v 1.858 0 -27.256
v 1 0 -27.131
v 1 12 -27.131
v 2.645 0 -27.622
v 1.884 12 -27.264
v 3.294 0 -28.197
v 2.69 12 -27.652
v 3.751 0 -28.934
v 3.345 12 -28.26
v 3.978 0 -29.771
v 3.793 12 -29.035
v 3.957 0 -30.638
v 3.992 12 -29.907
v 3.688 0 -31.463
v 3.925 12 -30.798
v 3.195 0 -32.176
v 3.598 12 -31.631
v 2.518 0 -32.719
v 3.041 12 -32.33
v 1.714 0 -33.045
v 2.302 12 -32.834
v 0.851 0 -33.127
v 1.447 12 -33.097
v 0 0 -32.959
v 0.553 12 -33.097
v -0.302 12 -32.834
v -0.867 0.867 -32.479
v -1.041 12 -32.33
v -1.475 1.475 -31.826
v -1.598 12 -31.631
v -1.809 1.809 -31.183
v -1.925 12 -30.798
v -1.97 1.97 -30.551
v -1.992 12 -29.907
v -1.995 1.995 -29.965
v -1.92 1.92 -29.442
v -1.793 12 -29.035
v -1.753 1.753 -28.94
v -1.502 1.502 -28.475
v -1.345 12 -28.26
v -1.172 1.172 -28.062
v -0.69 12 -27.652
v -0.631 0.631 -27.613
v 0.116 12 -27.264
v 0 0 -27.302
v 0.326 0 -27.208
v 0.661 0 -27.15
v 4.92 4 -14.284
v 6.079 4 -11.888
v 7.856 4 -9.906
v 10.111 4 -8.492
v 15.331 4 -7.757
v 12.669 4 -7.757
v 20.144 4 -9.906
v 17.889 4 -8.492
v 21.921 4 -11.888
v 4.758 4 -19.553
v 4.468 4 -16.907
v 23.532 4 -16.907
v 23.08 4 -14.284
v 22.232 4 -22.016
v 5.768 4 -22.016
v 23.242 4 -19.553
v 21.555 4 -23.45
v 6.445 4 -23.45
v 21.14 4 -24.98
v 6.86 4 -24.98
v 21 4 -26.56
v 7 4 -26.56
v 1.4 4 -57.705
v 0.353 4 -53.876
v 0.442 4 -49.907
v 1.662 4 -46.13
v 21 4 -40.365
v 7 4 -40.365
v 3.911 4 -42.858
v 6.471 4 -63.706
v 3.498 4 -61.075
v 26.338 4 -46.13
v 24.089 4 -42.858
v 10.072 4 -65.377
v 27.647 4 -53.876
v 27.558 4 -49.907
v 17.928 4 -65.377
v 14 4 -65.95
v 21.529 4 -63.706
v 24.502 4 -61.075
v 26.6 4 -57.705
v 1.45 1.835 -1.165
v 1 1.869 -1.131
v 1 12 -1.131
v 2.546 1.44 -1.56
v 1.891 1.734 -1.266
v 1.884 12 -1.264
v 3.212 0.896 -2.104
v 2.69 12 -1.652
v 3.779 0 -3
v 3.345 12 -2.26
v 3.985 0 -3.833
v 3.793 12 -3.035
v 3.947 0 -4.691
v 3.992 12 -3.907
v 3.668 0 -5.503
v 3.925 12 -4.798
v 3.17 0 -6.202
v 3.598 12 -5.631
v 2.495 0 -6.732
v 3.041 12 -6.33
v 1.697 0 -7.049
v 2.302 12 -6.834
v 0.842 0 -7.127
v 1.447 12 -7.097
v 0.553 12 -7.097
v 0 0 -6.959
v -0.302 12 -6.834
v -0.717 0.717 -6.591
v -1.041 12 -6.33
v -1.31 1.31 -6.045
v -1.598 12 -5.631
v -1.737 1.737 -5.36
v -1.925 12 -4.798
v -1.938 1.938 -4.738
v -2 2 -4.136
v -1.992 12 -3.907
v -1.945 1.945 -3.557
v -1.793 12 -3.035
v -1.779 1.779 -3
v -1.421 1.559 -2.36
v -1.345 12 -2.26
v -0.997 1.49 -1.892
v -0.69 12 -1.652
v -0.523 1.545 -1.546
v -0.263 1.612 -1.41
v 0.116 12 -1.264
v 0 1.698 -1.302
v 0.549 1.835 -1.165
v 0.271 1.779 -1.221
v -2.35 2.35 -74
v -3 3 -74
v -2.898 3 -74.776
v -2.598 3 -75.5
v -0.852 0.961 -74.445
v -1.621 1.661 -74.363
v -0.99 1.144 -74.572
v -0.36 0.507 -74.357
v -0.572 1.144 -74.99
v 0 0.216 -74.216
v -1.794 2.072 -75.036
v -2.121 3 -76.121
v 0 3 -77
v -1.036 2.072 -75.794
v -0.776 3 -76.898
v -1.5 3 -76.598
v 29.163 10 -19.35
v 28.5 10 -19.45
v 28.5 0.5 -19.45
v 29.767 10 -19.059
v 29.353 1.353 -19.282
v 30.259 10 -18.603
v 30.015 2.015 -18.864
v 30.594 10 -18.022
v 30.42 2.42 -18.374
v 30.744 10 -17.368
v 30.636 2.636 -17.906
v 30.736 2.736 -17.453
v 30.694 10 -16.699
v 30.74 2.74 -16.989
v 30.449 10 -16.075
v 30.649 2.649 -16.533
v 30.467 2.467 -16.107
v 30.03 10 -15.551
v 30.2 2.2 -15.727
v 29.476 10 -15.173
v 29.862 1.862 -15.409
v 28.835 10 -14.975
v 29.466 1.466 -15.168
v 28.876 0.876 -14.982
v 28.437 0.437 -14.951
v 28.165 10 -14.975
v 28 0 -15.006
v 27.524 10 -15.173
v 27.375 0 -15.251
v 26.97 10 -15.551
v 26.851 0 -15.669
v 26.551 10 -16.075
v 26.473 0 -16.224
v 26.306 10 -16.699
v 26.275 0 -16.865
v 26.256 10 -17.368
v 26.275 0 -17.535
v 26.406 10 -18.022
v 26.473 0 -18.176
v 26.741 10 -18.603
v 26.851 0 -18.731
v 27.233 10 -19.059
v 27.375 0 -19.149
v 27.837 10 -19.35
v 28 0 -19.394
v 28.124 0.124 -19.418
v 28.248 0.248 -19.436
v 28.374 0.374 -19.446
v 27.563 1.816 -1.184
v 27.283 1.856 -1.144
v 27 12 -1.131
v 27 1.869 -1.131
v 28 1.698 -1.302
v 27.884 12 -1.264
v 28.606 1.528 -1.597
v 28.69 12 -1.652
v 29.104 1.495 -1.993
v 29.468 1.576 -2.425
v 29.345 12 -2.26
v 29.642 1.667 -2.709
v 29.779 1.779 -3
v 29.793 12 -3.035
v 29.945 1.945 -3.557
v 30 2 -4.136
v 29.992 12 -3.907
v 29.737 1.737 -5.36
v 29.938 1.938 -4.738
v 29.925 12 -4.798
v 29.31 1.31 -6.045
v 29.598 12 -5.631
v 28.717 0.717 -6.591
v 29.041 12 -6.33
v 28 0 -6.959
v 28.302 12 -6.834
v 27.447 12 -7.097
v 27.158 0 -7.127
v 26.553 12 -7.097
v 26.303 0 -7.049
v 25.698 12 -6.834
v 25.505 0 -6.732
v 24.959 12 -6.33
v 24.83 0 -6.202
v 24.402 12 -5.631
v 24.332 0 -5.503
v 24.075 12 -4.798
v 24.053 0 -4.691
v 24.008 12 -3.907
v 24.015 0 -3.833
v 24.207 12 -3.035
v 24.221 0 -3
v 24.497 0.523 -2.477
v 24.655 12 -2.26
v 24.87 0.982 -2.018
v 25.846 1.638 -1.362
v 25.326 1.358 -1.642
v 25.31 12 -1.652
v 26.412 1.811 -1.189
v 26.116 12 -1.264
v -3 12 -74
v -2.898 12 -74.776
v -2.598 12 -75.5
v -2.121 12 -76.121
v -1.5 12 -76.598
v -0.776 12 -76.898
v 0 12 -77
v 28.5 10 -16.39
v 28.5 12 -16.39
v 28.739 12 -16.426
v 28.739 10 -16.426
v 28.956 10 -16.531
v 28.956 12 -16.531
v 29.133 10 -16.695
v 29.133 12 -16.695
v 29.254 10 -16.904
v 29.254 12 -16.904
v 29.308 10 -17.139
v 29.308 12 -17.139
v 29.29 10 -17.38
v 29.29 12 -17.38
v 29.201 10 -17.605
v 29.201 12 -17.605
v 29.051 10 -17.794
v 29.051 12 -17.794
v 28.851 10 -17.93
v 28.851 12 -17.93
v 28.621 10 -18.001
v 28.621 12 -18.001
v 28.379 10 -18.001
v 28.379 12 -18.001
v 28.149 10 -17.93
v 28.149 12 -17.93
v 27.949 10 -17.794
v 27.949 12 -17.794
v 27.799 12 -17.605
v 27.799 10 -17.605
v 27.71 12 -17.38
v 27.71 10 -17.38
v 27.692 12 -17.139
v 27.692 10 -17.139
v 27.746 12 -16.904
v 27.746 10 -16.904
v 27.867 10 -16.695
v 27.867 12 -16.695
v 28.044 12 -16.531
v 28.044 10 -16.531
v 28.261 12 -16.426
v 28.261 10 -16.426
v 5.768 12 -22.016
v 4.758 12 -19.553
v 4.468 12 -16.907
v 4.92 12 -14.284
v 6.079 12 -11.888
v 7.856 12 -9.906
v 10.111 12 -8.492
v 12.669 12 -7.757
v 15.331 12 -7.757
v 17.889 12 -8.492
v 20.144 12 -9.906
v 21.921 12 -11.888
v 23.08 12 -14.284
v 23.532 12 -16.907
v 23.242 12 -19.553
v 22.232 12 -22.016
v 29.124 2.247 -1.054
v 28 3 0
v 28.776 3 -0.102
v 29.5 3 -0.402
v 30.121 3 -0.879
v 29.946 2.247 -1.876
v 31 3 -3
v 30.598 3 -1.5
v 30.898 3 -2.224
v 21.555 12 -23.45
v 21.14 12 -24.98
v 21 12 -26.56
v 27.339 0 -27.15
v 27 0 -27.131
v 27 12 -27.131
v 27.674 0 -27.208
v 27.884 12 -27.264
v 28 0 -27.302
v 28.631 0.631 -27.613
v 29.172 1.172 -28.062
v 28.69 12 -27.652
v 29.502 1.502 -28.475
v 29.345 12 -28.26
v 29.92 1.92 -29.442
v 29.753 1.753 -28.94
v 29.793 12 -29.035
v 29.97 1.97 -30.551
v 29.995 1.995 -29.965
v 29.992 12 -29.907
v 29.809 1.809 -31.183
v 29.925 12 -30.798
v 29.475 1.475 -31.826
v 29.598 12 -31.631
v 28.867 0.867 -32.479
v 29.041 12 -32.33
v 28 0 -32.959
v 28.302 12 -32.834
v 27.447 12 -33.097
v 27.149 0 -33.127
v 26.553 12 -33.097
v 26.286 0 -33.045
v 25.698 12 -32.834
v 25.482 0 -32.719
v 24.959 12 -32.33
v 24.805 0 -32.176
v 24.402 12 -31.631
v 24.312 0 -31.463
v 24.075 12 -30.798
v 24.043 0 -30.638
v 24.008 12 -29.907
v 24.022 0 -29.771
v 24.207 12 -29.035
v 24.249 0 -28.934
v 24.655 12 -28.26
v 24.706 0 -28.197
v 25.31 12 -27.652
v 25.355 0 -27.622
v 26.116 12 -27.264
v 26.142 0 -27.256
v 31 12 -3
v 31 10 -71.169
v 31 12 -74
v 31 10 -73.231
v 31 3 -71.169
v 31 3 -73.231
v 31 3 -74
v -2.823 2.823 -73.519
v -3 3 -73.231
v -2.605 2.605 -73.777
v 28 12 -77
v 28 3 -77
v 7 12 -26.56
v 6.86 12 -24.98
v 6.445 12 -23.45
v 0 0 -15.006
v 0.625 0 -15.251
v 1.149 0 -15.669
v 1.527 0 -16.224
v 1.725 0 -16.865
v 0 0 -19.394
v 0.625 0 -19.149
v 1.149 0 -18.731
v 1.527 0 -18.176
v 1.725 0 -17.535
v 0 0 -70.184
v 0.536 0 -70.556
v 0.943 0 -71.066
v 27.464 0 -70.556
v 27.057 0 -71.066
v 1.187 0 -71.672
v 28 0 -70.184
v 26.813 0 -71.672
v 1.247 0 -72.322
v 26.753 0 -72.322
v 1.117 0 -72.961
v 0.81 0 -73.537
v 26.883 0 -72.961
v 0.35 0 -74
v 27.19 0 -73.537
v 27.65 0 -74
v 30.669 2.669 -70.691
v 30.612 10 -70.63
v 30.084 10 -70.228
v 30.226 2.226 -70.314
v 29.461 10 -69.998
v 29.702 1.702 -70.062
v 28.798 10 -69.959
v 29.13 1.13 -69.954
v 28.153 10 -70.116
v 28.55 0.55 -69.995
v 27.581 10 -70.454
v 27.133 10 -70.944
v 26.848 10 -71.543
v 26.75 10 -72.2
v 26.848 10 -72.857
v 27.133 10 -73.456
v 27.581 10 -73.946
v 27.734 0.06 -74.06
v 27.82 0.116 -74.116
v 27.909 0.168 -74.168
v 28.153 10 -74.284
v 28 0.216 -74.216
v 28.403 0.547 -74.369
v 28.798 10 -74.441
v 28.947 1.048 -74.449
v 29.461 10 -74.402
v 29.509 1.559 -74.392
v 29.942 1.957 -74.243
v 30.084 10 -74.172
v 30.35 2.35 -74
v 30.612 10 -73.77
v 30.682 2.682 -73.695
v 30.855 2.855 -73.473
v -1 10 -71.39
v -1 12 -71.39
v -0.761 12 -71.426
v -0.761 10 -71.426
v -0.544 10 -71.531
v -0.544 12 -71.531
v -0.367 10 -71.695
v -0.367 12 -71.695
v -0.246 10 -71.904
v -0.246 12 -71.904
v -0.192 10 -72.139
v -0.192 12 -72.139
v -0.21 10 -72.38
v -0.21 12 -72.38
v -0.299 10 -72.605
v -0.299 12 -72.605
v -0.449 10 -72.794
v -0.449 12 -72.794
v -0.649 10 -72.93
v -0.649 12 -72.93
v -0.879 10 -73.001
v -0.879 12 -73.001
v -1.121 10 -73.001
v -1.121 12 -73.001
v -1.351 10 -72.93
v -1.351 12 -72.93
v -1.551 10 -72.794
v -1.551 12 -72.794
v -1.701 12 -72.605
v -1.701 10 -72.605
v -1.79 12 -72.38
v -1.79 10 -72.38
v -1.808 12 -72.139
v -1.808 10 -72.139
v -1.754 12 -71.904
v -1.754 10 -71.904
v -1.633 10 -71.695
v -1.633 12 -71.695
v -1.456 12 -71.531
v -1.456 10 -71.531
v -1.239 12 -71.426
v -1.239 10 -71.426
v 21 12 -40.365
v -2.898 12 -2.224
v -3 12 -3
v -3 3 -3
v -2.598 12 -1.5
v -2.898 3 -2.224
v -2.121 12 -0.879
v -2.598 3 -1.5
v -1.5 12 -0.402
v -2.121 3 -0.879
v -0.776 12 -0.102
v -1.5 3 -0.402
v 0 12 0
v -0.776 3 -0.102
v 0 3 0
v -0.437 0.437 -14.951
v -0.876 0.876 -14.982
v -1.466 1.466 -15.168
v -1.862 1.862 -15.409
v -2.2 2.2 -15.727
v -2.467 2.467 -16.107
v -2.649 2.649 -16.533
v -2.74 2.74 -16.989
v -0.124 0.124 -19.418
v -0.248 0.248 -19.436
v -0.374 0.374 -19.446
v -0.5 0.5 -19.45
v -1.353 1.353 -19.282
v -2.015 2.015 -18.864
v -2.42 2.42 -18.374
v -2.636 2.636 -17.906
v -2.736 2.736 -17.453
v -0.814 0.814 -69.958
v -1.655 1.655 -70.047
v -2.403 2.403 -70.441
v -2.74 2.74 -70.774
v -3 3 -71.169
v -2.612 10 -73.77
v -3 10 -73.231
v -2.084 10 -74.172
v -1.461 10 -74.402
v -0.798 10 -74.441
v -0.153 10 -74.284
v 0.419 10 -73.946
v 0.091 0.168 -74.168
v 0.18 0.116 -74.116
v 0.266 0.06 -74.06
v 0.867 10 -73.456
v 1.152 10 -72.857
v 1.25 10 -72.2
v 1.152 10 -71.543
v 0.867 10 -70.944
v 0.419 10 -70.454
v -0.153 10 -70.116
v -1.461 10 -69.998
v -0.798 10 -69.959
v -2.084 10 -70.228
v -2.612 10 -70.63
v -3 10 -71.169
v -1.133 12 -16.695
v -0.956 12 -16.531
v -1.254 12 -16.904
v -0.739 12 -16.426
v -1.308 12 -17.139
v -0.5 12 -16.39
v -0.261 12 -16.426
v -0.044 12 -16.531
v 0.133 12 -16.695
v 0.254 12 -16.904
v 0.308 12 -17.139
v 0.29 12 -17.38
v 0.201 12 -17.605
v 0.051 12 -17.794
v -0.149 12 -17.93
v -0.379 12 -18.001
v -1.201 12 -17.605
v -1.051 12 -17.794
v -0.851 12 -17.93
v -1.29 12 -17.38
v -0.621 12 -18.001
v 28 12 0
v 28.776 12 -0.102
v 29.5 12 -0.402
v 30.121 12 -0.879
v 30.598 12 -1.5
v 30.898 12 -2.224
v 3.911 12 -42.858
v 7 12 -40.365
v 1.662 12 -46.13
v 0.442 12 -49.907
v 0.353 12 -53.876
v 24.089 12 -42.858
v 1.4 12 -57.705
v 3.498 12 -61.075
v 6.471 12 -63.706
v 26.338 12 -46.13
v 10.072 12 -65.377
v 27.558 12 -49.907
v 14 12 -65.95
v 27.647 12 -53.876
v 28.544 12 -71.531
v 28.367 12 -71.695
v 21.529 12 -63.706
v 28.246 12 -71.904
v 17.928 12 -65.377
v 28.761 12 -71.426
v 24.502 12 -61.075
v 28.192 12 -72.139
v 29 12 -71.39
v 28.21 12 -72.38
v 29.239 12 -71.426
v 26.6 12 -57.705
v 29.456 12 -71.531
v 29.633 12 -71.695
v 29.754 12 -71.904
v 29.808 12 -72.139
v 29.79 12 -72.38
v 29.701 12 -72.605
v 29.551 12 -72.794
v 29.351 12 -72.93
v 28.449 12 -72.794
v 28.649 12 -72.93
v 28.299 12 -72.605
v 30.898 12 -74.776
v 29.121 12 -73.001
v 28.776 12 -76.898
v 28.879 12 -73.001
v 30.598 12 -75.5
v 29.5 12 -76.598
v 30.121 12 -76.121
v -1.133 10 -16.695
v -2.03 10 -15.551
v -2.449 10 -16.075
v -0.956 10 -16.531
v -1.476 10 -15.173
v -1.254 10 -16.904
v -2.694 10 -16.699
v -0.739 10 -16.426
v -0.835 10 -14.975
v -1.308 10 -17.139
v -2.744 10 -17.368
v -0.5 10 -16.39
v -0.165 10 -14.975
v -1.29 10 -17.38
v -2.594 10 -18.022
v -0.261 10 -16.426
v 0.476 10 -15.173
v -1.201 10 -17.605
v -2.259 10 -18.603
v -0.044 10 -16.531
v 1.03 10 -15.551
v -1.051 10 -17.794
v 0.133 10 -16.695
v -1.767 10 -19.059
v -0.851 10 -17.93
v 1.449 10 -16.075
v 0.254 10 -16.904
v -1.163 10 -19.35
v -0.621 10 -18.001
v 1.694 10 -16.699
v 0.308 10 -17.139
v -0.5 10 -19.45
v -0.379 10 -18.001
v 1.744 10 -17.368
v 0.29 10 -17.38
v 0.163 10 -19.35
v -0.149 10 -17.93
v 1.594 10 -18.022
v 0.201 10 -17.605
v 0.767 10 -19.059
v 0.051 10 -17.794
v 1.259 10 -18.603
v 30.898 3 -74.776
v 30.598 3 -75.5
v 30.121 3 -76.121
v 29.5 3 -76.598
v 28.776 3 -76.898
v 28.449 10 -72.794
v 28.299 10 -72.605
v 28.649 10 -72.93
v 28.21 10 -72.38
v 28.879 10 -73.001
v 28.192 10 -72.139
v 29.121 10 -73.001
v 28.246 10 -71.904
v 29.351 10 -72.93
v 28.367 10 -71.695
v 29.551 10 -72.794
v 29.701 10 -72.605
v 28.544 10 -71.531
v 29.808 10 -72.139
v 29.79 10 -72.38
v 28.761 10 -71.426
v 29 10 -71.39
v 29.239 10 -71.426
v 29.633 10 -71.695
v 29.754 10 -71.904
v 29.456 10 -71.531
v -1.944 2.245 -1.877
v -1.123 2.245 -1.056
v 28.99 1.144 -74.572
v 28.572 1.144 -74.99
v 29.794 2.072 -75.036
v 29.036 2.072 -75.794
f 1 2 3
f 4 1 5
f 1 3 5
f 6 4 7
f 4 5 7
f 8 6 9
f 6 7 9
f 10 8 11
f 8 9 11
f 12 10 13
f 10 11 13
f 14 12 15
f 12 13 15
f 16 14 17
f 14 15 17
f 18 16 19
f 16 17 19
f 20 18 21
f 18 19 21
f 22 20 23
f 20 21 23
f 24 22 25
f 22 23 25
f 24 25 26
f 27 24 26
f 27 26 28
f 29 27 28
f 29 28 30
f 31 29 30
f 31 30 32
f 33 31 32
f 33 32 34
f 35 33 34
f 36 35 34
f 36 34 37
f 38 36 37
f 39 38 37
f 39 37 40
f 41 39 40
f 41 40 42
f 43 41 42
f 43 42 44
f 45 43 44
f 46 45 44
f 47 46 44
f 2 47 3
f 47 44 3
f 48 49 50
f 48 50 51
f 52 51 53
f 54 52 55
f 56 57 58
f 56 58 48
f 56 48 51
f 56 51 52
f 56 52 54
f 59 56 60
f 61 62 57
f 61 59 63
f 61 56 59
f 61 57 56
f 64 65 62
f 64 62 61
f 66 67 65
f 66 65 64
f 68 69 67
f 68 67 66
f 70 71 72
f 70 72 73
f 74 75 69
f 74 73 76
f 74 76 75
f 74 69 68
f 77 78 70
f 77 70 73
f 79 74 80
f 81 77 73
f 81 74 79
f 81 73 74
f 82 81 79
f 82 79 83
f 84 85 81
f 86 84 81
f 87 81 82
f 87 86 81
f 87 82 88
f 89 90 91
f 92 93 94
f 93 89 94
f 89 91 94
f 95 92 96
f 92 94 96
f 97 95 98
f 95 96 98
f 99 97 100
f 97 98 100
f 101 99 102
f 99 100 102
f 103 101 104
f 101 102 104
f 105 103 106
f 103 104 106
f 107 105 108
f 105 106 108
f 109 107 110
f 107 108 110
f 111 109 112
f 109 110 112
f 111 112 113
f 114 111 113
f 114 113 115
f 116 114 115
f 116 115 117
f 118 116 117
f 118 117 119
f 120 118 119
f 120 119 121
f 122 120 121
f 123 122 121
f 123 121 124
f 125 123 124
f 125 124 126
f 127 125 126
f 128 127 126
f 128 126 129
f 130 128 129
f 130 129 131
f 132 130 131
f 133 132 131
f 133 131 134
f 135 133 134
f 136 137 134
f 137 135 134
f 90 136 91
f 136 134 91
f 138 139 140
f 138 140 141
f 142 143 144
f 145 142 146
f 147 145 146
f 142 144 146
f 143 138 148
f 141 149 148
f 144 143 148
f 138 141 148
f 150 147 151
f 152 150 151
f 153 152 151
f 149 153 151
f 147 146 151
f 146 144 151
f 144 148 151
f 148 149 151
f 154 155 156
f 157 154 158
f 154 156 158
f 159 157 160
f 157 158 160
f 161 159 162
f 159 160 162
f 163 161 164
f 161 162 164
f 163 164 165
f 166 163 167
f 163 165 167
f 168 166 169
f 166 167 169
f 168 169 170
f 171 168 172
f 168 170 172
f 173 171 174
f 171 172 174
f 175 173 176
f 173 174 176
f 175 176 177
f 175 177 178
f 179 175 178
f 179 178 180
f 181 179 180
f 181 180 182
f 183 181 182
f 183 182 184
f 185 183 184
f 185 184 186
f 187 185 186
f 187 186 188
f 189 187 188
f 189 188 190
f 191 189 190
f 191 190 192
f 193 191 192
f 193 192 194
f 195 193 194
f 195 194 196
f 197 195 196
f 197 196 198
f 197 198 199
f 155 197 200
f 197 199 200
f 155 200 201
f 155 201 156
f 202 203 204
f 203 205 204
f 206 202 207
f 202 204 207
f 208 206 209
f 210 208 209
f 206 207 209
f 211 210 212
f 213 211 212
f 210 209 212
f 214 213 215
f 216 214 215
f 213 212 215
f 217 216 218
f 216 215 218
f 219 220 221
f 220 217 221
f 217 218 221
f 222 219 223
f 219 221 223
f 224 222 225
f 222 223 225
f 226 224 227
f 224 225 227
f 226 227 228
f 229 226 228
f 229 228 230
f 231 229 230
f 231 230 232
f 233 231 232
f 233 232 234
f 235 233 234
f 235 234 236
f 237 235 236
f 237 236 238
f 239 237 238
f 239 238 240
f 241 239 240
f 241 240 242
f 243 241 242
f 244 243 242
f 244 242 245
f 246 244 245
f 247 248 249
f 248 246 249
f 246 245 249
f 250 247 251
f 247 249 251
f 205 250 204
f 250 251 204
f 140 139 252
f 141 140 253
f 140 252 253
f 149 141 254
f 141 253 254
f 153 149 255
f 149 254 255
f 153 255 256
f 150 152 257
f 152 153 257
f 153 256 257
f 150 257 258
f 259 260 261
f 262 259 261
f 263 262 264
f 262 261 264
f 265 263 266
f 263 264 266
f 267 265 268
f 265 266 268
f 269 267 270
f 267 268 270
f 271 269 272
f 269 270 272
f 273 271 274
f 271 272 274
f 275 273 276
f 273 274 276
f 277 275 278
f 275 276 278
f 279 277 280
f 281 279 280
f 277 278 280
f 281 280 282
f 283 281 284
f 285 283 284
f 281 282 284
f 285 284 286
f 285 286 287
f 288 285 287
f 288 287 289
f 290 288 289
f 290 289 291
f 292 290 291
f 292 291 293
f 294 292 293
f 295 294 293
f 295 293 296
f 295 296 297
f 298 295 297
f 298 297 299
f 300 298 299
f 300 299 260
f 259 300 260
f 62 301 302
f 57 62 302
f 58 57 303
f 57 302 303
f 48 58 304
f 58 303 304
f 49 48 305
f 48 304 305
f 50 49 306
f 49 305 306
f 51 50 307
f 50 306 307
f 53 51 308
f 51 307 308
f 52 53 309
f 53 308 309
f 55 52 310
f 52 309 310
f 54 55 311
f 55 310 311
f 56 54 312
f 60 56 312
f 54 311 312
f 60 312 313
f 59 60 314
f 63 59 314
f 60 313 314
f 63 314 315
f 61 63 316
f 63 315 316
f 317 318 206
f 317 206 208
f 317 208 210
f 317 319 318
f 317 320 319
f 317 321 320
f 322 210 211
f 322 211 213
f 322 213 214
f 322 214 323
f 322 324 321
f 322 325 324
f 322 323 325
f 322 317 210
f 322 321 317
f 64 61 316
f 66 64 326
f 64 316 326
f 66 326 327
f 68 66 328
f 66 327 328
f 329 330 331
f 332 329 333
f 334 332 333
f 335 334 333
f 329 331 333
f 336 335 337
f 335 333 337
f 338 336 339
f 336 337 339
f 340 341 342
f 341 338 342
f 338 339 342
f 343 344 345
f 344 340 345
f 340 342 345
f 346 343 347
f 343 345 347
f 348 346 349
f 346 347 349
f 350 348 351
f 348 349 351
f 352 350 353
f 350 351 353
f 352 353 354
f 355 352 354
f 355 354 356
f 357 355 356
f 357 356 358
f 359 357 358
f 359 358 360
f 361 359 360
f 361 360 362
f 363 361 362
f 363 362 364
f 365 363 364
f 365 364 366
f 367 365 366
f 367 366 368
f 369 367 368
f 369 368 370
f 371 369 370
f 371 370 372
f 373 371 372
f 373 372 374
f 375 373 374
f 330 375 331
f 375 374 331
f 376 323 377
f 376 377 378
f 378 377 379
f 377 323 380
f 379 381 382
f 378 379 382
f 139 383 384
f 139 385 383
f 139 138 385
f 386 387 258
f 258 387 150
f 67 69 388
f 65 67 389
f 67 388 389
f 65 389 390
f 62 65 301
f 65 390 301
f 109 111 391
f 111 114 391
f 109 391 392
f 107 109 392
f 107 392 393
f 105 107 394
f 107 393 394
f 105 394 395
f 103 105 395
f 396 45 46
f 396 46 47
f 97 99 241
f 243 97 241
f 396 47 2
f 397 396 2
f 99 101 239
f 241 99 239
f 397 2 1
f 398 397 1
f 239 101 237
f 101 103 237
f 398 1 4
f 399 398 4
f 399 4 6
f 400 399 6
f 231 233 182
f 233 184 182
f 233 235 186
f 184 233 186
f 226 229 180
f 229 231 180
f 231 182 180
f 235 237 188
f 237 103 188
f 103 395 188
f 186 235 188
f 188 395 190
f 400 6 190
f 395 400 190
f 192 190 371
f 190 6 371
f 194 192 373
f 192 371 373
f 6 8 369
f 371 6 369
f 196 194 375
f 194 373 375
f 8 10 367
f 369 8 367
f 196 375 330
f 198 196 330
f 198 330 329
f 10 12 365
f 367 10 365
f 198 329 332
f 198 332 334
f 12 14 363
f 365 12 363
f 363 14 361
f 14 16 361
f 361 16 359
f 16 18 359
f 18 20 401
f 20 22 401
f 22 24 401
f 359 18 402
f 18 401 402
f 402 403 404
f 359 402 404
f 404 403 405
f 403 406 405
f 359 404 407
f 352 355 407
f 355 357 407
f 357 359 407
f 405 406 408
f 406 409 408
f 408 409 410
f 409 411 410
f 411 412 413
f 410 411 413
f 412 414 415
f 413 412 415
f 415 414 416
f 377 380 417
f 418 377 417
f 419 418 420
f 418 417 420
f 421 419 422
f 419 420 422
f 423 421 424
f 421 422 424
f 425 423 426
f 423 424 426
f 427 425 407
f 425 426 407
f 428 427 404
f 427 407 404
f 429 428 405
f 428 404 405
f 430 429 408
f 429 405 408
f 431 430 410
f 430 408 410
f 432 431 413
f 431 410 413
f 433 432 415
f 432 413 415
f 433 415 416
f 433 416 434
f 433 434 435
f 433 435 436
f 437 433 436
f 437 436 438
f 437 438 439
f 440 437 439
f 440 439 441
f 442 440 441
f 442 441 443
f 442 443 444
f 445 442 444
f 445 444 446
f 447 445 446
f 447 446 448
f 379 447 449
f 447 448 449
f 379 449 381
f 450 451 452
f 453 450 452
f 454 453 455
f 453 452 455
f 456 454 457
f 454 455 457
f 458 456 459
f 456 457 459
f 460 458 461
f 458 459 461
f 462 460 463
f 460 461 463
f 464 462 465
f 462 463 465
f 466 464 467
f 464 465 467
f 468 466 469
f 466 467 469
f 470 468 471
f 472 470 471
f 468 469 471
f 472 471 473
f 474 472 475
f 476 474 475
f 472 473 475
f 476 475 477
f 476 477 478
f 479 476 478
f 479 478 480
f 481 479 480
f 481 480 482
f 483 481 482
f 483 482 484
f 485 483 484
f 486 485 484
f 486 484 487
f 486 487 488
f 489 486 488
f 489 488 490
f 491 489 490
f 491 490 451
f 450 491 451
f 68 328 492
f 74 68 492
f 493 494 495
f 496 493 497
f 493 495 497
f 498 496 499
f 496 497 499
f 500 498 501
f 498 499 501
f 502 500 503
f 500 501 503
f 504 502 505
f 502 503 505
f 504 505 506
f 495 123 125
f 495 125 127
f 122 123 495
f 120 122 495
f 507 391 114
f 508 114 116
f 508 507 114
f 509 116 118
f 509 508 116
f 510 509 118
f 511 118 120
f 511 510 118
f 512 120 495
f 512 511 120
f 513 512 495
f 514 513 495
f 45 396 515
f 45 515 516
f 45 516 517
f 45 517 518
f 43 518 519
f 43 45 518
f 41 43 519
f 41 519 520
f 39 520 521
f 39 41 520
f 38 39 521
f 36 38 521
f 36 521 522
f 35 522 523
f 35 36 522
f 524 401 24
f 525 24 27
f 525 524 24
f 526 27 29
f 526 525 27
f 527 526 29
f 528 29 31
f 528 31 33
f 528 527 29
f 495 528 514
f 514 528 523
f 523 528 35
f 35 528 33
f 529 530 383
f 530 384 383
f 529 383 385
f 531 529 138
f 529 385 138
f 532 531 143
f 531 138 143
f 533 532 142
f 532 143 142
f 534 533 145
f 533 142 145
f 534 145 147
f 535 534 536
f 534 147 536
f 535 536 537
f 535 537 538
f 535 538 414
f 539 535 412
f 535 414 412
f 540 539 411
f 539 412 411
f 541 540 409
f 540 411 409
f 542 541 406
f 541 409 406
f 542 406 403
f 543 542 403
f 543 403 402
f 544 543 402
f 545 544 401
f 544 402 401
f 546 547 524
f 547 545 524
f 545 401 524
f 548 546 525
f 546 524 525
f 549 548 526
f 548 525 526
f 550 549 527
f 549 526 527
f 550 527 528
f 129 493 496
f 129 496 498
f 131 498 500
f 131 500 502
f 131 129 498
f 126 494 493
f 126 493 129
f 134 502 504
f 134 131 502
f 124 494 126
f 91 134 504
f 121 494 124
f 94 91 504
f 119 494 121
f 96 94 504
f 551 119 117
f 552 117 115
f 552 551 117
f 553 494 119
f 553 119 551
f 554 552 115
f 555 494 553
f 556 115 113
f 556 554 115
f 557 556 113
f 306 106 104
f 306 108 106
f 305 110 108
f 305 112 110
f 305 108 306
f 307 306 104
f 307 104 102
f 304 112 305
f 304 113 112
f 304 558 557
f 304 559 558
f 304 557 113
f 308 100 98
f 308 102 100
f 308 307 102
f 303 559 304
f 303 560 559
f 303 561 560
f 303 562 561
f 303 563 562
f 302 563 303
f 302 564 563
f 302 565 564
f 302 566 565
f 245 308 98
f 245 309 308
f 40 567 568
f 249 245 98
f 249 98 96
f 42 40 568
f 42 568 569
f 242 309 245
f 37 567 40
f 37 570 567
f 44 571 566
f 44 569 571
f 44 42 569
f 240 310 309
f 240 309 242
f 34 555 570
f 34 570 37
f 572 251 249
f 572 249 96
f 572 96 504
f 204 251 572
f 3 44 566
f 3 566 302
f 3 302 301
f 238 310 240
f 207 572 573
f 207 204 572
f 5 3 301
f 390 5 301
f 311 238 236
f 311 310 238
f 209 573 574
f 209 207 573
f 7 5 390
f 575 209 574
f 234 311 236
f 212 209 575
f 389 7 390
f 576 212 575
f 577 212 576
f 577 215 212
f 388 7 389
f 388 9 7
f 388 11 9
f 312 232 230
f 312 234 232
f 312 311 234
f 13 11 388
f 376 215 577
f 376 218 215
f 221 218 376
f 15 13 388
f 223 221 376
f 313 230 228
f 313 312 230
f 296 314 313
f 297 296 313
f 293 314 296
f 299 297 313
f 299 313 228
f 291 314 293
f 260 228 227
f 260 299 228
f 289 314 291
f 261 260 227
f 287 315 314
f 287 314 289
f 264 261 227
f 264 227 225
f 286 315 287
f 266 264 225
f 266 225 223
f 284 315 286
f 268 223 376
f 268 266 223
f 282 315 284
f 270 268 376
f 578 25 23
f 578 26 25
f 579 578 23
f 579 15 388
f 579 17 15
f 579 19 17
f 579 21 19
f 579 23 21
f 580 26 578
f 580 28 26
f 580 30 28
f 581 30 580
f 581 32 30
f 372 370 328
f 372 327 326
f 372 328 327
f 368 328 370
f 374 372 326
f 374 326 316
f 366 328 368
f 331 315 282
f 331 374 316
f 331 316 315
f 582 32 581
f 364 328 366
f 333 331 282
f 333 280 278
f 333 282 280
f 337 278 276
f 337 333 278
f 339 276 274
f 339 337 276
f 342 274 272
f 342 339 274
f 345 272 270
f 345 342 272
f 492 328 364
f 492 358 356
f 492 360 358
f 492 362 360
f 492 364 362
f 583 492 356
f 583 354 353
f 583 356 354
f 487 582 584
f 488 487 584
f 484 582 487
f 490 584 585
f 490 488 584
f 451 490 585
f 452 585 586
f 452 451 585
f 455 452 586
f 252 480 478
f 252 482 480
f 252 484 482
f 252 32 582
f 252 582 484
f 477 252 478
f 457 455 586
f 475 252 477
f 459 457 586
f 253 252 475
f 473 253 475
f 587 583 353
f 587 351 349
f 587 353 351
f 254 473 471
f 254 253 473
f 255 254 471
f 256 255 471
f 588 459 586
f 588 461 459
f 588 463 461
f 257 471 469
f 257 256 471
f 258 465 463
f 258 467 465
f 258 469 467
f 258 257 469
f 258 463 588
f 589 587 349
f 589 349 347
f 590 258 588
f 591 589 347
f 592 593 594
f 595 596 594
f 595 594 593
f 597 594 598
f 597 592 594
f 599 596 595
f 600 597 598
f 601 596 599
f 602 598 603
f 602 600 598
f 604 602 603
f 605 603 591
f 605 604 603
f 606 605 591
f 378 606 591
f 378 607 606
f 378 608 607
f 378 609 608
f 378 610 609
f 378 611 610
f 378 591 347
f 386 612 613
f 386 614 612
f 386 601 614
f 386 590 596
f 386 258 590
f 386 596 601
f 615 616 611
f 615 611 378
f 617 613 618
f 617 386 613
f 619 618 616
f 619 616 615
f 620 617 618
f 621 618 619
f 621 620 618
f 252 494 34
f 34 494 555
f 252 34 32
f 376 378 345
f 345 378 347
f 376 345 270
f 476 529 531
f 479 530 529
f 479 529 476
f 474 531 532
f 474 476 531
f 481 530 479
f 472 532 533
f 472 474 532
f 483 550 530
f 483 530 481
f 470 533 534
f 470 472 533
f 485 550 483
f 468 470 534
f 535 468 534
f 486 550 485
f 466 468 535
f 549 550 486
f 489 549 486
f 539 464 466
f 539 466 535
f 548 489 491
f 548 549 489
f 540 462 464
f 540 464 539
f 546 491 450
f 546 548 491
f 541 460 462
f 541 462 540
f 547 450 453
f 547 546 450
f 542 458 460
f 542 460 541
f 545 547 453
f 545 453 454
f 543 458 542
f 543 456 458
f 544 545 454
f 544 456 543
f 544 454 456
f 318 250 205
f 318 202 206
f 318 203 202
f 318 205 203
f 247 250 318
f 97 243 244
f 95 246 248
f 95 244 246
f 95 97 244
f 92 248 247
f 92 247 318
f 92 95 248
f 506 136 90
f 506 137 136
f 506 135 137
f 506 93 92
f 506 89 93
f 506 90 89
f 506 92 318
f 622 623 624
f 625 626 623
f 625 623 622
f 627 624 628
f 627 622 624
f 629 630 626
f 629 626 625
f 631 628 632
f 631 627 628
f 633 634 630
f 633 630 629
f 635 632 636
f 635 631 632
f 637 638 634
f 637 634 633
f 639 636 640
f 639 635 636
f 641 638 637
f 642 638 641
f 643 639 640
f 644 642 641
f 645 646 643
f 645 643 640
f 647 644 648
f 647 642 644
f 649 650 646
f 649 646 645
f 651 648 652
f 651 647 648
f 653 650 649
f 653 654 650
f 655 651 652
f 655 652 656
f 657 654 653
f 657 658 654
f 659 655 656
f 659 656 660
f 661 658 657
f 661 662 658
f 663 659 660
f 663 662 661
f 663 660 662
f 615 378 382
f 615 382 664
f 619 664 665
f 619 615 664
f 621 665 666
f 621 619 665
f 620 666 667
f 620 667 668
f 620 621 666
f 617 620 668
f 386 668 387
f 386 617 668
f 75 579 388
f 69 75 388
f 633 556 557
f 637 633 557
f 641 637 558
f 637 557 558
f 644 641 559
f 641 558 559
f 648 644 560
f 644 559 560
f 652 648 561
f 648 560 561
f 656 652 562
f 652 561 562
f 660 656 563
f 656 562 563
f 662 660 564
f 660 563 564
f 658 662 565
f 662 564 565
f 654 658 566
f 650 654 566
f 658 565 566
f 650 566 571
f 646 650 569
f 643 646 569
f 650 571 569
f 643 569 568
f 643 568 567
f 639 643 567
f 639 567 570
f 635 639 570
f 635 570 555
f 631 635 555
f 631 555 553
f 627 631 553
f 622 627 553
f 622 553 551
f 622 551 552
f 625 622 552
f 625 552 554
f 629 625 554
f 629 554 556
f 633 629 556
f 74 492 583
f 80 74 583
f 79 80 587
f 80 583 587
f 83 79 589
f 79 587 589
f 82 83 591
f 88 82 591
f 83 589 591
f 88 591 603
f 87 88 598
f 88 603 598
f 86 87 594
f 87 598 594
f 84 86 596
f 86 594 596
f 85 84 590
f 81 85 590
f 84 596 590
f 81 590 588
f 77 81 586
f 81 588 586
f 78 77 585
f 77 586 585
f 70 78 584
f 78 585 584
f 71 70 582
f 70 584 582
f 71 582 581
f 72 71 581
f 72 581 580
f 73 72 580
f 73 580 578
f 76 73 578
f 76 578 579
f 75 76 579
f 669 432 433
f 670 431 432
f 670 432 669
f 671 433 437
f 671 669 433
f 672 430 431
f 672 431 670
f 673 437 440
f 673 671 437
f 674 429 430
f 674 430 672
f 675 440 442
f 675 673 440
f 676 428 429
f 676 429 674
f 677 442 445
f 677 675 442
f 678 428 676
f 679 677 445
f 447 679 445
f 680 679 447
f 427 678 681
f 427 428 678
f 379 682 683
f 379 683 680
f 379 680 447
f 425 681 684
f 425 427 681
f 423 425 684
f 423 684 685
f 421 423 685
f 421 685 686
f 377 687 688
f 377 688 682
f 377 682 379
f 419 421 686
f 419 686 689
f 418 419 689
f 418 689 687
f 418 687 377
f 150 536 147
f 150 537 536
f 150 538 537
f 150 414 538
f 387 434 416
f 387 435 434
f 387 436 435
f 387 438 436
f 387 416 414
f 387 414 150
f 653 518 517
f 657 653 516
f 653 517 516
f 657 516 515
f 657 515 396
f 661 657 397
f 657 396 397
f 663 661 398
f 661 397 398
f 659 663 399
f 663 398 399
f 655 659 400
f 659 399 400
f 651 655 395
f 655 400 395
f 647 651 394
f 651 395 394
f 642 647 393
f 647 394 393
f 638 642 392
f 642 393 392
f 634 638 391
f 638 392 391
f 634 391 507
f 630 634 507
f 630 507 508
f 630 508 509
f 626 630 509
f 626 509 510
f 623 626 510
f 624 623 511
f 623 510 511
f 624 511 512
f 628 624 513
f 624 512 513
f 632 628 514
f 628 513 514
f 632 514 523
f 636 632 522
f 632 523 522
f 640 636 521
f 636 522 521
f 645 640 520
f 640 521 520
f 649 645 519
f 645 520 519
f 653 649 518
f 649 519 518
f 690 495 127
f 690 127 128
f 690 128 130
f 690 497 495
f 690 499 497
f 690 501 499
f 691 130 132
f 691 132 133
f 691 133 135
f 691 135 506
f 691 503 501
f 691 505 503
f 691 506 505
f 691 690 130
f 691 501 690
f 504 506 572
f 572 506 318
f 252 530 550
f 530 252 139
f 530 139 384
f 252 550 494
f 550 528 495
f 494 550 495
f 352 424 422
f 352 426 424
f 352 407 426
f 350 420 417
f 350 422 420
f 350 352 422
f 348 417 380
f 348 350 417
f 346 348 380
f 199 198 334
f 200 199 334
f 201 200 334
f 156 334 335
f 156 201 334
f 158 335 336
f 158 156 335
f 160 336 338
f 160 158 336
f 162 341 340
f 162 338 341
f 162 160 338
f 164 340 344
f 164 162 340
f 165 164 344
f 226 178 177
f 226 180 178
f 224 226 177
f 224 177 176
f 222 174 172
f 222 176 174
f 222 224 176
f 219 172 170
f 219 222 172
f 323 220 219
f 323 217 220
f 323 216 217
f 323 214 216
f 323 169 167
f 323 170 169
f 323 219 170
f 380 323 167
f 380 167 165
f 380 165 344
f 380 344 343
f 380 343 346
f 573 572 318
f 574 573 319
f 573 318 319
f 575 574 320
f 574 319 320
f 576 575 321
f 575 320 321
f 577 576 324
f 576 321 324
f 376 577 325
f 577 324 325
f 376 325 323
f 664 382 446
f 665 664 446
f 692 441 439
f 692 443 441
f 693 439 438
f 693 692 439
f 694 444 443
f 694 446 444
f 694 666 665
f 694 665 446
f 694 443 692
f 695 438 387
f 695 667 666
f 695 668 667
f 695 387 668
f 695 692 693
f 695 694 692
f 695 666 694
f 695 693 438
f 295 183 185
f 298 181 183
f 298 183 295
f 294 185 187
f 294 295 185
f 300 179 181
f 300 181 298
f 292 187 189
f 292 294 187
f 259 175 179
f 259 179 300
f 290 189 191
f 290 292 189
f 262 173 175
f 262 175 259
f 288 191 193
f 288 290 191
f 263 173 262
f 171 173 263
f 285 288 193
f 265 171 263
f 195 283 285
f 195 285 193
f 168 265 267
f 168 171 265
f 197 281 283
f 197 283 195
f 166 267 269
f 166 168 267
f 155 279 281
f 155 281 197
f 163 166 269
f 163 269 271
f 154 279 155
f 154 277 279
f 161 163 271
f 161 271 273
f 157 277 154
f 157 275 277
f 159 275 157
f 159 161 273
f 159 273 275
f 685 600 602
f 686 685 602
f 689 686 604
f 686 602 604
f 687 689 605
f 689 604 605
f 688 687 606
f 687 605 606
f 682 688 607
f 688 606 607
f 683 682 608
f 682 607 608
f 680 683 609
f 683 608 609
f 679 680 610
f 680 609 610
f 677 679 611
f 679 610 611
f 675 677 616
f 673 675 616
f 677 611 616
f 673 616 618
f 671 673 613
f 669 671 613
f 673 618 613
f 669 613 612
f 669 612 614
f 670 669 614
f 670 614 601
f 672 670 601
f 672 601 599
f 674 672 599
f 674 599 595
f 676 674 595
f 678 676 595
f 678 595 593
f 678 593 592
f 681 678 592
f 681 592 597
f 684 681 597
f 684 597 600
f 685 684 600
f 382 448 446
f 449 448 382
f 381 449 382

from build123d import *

# Parameters (mm, degrees)
EXTRUDE_1_DEPTH     = 12
SKETCH_2_R          = 3
SKETCH_2_R_2        = 0.81
CUT_EXTRUDE_1_DEPTH = 12
CUT_EXTRUDE_2_DEPTH = 8
FILLET_1_R          = 3
SKETCH_4_R          = 2.25
CUT_EXTRUDE_3_DEPTH = 10
CHAMFER_3_SIZE      = 3


with BuildPart() as part:
    # 草图1 → 凸台-拉伸1 (new body)
    with BuildSketch(Plane(origin=(0, 0, 0), x_dir=(1, 0, 0), z_dir=(0, 1, 0))):
        with BuildLine():
            Line((0, 0), (28, 0))
            ThreePointArc((28, 0), (30.121320344, 0.878679656), (31, 3))
            Line((31, 3), (31, 77))
            Line((31, 77), (-3, 77))
            Line((-3, 77), (-3, 3))
            ThreePointArc((-3, 3), (-2.121320344, 0.878679656), (0, 0))
        make_face()
    extrude(amount=EXTRUDE_1_DEPTH)

    # 草图2 → 切除-拉伸1 (cut)
    with BuildSketch(Plane(origin=(14.000000253, 12, -382.2), x_dir=(1, 0, 0), z_dir=(0, 1, 0))):
        with Locations(Location((13, -352.069110398, 0), (0, 0, 270))):
            Circle(SKETCH_2_R)
        with Locations(Location((-13, -352.069110398, 0), (0, 0, 270))):
            Circle(SKETCH_2_R)
        with Locations(Location((13, -378.069110398, 0), (0, 0, 270))):
            Circle(SKETCH_2_R)
        with Locations(Location((-13, -378.069110398, 0), (0, 0, 270))):
            Circle(SKETCH_2_R)
        with Locations(Location((-15.000000143, -309.999984702, 0), (0, 0, 270))):
            Circle(SKETCH_2_R_2)
        with Locations(Location((15.000000143, -309.999984702, 0), (0, 0, 270))):
            Circle(SKETCH_2_R_2)
        with Locations(Location((14.500000253, -365.000006616, 0), (0, 0, 270))):
            Circle(SKETCH_2_R_2)
        with Locations(Location((-14.500000253, -365.000006616, 0), (0, 0, 270))):
            Circle(SKETCH_2_R_2)
    extrude(amount=-CUT_EXTRUDE_1_DEPTH, mode=Mode.SUBTRACT)

    # 草图3 → 切除-拉伸2 (cut)
    with BuildSketch(Plane(origin=(14.000000253, 12, -382.2), x_dir=(1, 0, 0), z_dir=(0, 1, 0))):
        with BuildLine():
            Line((-7.000000134, -341.834781862), (-7.000000134, -355.639881164))
            ThreePointArc((-7.000000134, -355.639881164), (-7.313370109, -357.994123887), (-8.231657645, -360.184422392))
            ThreePointArc((-8.231657645, -360.184422392), (0, -374.536779603), (8.231657645, -360.184422392))
            ThreePointArc((8.231657645, -360.184422392), (7.313370109, -357.994123887), (7.000000134, -355.639881164))
            Line((7.000000134, -355.639881164), (7.000000134, -341.834782031))
            ThreePointArc((7.000000134, -341.834782031), (3.09e-07, -316.249981647), (-7.000000134, -341.834781862))
        make_face()
    extrude(amount=-CUT_EXTRUDE_2_DEPTH, mode=Mode.SUBTRACT)

    # 圆角1
    fillet_1_edges = [part.edges().sort_by_distance(p)[0] for p in [
        (-3, 6, -77),
        (31, 6, -77),
    ]]
    fillet(fillet_1_edges, radius=FILLET_1_R)

    # 草图4 → 切除-拉伸3 (cut)
    with BuildSketch(Plane.XZ):
        with Locations(Location((-0.5, -17.199993384, 0), (0, 0, 270))):
            Circle(SKETCH_4_R)
        with Locations(Location((28.500000507, -17.199993384, 0), (0, 0, 270))):
            Circle(SKETCH_4_R)
        with Locations((-0.99999989, -72.200015298)):
            Circle(SKETCH_4_R)
        with Locations((29.000000396, -72.200015298)):
            Circle(SKETCH_4_R)
    extrude(amount=-CUT_EXTRUDE_3_DEPTH, mode=Mode.SUBTRACT)

    # 倒角3
    # the kernel refuses this chamfer: 3 mm, written as the material it takes off along each edge
    with BuildSketch(Plane(origin=(0, 0, -74), x_dir=(-1, 0, 0), z_dir=(0, 0, 1))) as chamfer_3_piece_1:
        with BuildLine():
            Line((3 - CHAMFER_3_SIZE, 0), (3.084852814, -3.084852814))
            Line((3.084852814, -3.084852814), (3.144852814, -3.084852814))
            ThreePointArc((3.144852814, -3.084852814), (3.06, -1.542426407), (3.06, 0))
            Line((3.06, 0), (3, 0.06))
            Line((3, 0.06), (0, 0.142518829))
            Line((0, 0.142518829), (3 - CHAMFER_3_SIZE, 0))
        make_face()
    revolve(axis=Axis((0, 0, -74), (0, -1, 0)), revolution_arc=90, mode=Mode.SUBTRACT)
    with BuildSketch(Plane(origin=(-3, 0, -74), x_dir=(1, 0, 0), z_dir=(0, 0, 1))) as chamfer_3_piece_2:
        with BuildLine():
            Line((3.084852814, -0.084852814), (-0.084852814, 3.084852814))
            Line((-0.084852814, 3.084852814), (-0.144852814, 3.084852814))
            ThreePointArc((-0.144852814, 3.084852814), (-0.06, 1.542426407), (-0.06, 0))
            Line((-0.06, 0), (0, -0.06))
            ThreePointArc((0, -0.06), (1.542426407, -0.06), (3.084852814, -0.144852814))
            Line((3.084852814, -0.144852814), (3.084852814, -0.084852814))
        make_face()
    extrude(amount=8.484257474, mode=Mode.SUBTRACT)
    with BuildSketch(Plane(origin=(31, 0, -65.515743509), x_dir=(-1, 0, 0), z_dir=(0, 0, -1))) as chamfer_3_piece_3:
        with BuildLine():
            Line((3.084852814, -0.084852814), (-0.084852814, 3.084852814))
            Line((-0.084852814, 3.084852814), (-0.144852814, 3.084852814))
            ThreePointArc((-0.144852814, 3.084852814), (-0.06, 1.542426407), (-0.06, 0))
            Line((-0.06, 0), (0, -0.06))
            ThreePointArc((0, -0.06), (1.542426407, -0.06), (3.084852814, -0.144852814))
            Line((3.084852814, -0.144852814), (3.084852814, -0.084852814))
        make_face()
    extrude(amount=8.484256491, mode=Mode.SUBTRACT)
    with BuildSketch(Plane(origin=(28, 0, -74), x_dir=(1, 0, 0), z_dir=(0, 0, 1))) as chamfer_3_piece_4:
        with BuildLine():
            Line((3 - CHAMFER_3_SIZE, 0), (3.084852814, 3.084852814))
            Line((3.084852814, 3.084852814), (3.144852814, 3.084852814))
            ThreePointArc((3.144852814, 3.084852814), (3.06, 1.542426407), (3.06, 0))
            Line((3.06, 0), (3, -0.06))
            Line((3, -0.06), (0, -0.142518829))
            Line((0, -0.142518829), (3 - CHAMFER_3_SIZE, 0))
        make_face()
    revolve(axis=Axis((28, 0, -74), (0, 1, 0)), revolution_arc=90, mode=Mode.SUBTRACT)
    with BuildSketch(Plane(origin=(28, 0, -77), x_dir=(0, 0, 1), z_dir=(-1, 0, 0))) as chamfer_3_piece_5:
        with BuildLine():
            Line((3.084852814, -0.084852814), (-0.084852814, 3.084852814))
            Line((-0.084852814, 3.084852814), (-0.144852814, 3.084852814))
            ThreePointArc((-0.144852814, 3.084852814), (-0.06, 1.542426407), (-0.06, 0))
            Line((-0.06, 0), (0, -0.06))
            ThreePointArc((0, -0.06), (1.542426407, -0.06), (3.084852814, -0.144852814))
            Line((3.084852814, -0.144852814), (3.084852814, -0.084852814))
        make_face()
    extrude(amount=28, mode=Mode.SUBTRACT)
    # the kernel refuses this chamfer: 3 mm, written as the material it takes off along each edge
    with BuildSketch(Plane(origin=(-3, 0, -73.23079149), x_dir=(0, 1, 0), z_dir=(0, 0, 1))) as chamfer_3_2_piece_1:
        with BuildLine():
            Line((3.084852814, 0.084852814), (-0.084852814, -3.084852814))
            Line((-0.084852814, -3.084852814), (-0.144852814, -3.084852814))
            ThreePointArc((-0.144852814, -3.084852814), (-0.06, -1.542426407), (-0.06, 0))
            Line((-0.06, 0), (0, 0.06))
            ThreePointArc((0, 0.06), (1.542426407, 0.06), (3.084852814, 0.144852814))
            Line((3.084852814, 0.144852814), (3.084852814, 0.084852814))
        make_face()
    extrude(amount=70.23079149, mode=Mode.SUBTRACT)
    with BuildSketch(Plane(origin=(0, 0, -3), x_dir=(-1, 0, 0), z_dir=(0, 0, -1))) as chamfer_3_2_piece_2:
        with BuildLine():
            Line((3 - CHAMFER_3_SIZE, 0), (3.084852814, 3.084852814))
            Line((3.084852814, 3.084852814), (3.144852814, 3.084852814))
            ThreePointArc((3.144852814, 3.084852814), (3.06, 1.542426407), (3.06, 0))
            Line((3.06, 0), (3, -0.06))
            Line((3, -0.06), (0, -0.142518829))
            Line((0, -0.142518829), (3 - CHAMFER_3_SIZE, 0))
        make_face()
    revolve(axis=Axis((0, 0, -3), (0, 1, 0)), revolution_arc=90, mode=Mode.SUBTRACT)
    with BuildSketch(Plane(origin=(0, 0, 0), x_dir=(0, 0, -1), z_dir=(1, 0, 0))) as chamfer_3_2_piece_3:
        with BuildLine():
            Line((3.084852814, -0.084852814), (-0.084852814, 3.084852814))
            Line((-0.084852814, 3.084852814), (-0.144852814, 3.084852814))
            ThreePointArc((-0.144852814, 3.084852814), (-0.06, 1.542426407), (-0.06, 0))
            Line((-0.06, 0), (0, -0.06))
            ThreePointArc((0, -0.06), (1.542426407, -0.06), (3.084852814, -0.144852814))
            Line((3.084852814, -0.144852814), (3.084852814, -0.084852814))
        make_face()
    extrude(amount=28, mode=Mode.SUBTRACT)
    with BuildSketch(Plane(origin=(28, 0, -3), x_dir=(0, 0, 1), z_dir=(-1, 0, 0))) as chamfer_3_2_piece_4:
        with BuildLine():
            Line((3 - CHAMFER_3_SIZE, 0), (3.084852814, 3.084852814))
            Line((3.084852814, 3.084852814), (3.144852814, 3.084852814))
            ThreePointArc((3.144852814, 3.084852814), (3.06, 1.542426407), (3.06, 0))
            Line((3.06, 0), (3, -0.06))
            Line((3, -0.06), (0, -0.142518829))
            Line((0, -0.142518829), (3 - CHAMFER_3_SIZE, 0))
        make_face()
    revolve(axis=Axis((28, 0, -3), (0, 1, 0)), revolution_arc=90, mode=Mode.SUBTRACT)
    with BuildSketch(Plane(origin=(31, 0, -3), x_dir=(-1, 0, 0), z_dir=(0, 0, -1))) as chamfer_3_2_piece_5:
        with BuildLine():
            Line((3.084852814, -0.084852814), (-0.084852814, 3.084852814))
            Line((-0.084852814, 3.084852814), (-0.144852814, 3.084852814))
            ThreePointArc((-0.144852814, 3.084852814), (-0.06, 1.542426407), (-0.06, 0))
            Line((-0.06, 0), (0, -0.06))
            ThreePointArc((0, -0.06), (1.542426407, -0.06), (3.084852814, -0.144852814))
            Line((3.084852814, -0.144852814), (3.084852814, -0.084852814))
        make_face()
    extrude(amount=70.230792473, mode=Mode.SUBTRACT)


solid = part.part
